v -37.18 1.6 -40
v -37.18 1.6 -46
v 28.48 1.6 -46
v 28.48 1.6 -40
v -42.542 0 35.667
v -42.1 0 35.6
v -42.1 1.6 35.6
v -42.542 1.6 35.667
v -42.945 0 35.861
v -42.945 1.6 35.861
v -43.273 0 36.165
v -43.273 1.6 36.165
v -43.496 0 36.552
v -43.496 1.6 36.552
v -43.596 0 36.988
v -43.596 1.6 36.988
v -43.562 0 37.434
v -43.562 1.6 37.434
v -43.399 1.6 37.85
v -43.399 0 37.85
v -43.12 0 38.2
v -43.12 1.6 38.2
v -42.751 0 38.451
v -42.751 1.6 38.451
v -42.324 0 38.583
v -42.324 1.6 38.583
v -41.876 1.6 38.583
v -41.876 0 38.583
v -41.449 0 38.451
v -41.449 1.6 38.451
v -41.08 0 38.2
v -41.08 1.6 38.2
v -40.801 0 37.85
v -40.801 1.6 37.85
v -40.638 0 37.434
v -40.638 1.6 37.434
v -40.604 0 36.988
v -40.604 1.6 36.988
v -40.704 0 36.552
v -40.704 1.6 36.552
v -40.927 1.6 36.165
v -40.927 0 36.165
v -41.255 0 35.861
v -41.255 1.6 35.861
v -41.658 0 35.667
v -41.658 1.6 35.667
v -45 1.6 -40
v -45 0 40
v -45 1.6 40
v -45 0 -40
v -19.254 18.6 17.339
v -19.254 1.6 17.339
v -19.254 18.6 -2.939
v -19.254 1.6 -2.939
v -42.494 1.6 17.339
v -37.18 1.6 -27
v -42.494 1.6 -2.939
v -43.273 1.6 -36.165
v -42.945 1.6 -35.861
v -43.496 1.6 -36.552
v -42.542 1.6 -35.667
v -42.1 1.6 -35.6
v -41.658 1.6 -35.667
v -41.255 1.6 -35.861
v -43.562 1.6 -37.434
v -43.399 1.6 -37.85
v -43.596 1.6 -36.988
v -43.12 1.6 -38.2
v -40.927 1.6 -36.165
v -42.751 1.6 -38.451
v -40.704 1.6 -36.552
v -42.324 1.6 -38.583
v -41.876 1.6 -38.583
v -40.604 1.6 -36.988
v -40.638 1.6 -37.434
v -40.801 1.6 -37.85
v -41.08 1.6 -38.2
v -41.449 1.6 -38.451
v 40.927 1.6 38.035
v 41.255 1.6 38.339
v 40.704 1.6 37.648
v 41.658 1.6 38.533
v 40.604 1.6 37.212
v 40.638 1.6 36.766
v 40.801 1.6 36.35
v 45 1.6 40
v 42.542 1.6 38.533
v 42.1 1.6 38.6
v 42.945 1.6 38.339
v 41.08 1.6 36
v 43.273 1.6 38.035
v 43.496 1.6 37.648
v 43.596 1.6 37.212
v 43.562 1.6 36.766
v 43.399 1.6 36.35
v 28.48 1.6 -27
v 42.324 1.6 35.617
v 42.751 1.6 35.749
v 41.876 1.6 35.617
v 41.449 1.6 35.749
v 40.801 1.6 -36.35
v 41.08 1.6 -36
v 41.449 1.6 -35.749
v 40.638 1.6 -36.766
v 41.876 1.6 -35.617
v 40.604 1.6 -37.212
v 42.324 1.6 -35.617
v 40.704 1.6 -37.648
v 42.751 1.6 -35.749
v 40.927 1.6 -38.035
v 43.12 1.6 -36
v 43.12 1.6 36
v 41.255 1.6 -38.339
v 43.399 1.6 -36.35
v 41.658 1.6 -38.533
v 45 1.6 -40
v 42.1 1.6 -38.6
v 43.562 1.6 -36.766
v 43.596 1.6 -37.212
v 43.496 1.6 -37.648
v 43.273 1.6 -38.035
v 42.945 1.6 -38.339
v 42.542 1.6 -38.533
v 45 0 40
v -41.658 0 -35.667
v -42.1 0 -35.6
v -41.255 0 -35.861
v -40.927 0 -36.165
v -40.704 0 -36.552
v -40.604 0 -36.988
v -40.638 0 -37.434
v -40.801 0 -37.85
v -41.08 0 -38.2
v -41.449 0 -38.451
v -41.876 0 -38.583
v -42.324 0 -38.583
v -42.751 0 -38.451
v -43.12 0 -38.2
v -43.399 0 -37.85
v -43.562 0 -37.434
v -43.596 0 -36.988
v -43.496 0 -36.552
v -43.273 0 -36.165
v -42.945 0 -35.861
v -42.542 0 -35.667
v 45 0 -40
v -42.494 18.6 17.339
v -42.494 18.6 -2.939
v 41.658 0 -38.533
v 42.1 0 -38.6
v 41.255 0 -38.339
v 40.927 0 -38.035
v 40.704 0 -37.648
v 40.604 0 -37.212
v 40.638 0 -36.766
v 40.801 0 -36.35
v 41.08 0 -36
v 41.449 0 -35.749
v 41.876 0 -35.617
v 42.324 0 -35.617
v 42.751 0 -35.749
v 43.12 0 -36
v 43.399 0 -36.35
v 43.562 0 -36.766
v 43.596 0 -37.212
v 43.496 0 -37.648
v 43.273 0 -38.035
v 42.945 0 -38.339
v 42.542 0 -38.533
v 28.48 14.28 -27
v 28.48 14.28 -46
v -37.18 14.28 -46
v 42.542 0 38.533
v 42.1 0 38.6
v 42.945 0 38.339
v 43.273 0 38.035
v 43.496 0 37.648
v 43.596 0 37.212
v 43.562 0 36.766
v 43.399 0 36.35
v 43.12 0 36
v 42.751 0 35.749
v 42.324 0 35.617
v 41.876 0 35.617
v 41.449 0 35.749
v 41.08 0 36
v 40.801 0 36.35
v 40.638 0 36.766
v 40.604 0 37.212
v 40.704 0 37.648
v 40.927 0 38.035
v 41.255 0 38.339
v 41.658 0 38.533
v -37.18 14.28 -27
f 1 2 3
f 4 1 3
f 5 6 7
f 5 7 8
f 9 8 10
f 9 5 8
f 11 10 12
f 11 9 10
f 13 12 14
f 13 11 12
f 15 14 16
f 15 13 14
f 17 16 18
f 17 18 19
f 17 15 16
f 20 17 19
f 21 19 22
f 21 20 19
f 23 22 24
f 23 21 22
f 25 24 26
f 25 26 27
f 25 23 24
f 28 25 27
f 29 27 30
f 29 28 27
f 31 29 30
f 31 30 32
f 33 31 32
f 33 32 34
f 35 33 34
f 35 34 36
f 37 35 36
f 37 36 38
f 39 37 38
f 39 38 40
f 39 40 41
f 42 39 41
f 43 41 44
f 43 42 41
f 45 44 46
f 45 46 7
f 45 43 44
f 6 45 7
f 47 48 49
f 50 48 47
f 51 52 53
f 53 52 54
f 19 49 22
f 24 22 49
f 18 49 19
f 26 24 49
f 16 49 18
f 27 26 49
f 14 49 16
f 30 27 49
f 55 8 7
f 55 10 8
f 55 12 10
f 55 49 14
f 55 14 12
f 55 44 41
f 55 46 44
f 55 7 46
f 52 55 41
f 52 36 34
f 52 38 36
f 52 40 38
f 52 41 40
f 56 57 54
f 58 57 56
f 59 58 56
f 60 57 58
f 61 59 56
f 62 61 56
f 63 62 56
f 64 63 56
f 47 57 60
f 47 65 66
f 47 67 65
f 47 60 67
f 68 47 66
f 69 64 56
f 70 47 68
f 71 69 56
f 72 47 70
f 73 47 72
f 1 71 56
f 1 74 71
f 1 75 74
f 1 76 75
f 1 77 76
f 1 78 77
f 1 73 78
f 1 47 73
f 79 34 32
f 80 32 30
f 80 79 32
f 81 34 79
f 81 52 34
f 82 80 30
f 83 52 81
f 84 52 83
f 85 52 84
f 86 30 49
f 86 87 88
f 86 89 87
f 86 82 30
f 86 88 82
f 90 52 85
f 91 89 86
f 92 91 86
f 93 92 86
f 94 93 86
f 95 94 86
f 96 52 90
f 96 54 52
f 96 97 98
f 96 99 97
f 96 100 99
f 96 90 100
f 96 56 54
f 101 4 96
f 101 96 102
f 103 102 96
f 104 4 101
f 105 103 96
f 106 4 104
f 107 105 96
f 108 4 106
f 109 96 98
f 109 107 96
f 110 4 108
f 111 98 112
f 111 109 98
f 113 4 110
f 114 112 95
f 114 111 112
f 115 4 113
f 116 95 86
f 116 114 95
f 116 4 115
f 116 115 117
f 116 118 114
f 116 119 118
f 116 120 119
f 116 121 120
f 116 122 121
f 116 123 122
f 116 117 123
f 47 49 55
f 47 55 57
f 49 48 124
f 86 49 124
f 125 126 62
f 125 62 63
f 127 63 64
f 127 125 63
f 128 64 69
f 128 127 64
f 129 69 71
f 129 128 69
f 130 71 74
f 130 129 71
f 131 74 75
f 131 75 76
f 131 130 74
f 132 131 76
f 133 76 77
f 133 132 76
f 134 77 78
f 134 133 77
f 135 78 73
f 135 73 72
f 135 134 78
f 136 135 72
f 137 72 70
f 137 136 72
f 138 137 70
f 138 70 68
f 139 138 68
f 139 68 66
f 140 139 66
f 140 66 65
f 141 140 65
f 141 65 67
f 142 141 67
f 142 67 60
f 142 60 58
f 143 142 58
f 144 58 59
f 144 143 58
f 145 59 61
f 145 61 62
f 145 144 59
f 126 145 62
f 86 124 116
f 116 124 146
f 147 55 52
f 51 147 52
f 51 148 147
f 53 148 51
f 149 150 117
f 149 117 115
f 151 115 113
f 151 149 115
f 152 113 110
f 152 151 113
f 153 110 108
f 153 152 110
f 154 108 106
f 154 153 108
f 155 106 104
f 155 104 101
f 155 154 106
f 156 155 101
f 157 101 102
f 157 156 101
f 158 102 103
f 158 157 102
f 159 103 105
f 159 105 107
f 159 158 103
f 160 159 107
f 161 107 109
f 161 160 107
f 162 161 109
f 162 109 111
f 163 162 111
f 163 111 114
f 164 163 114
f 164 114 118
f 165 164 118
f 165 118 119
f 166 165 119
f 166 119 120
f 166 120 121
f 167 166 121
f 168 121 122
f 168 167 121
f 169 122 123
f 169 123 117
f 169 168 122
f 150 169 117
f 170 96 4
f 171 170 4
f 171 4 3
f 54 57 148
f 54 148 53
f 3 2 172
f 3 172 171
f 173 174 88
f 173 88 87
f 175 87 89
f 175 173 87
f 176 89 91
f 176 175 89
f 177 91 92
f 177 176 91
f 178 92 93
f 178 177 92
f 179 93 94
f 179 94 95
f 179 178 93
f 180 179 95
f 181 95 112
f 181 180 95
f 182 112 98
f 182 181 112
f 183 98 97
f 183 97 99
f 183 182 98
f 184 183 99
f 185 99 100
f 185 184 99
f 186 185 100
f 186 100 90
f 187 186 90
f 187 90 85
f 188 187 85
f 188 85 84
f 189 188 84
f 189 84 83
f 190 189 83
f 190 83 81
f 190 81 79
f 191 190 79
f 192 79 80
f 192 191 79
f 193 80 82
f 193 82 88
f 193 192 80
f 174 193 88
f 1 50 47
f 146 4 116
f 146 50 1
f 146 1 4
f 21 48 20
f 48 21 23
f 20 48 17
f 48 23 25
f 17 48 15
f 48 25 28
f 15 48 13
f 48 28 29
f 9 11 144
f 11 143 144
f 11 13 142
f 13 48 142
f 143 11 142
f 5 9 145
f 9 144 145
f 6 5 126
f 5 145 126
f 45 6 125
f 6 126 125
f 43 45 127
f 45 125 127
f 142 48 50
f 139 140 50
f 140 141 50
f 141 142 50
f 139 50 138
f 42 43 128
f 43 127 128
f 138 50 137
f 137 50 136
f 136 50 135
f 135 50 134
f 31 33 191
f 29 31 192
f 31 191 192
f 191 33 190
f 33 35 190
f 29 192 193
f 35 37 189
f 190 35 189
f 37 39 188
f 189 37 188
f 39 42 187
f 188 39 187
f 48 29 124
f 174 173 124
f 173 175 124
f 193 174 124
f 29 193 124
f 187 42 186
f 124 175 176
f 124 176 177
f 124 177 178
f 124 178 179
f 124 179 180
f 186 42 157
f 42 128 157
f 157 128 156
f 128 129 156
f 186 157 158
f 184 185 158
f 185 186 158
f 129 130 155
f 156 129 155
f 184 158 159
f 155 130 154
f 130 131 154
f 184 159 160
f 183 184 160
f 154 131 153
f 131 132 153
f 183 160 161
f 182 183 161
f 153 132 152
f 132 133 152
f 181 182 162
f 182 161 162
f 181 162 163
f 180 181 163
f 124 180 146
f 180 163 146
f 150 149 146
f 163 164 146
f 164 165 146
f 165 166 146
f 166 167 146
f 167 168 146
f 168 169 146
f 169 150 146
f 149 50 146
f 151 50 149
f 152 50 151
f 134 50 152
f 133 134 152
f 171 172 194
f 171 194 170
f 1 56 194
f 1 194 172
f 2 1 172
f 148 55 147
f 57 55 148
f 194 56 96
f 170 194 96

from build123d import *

# Parameters (mm, degrees)
SKETCH1_W           = 90
SKETCH1_H           = 80
SKETCH1_R           = 1.5
BOSS_EXTRUDE2_DEPTH = 1.6
SKETCH2_W           = 65.66
SKETCH2_H           = 19
BOSS_EXTRUDE3_DEPTH = 12.68
SKETCH3_W           = 23.240933929
SKETCH3_H           = 20.278854114
BOSS_EXTRUDE4_DEPTH = 17


with BuildPart() as part:
    # Sketch1 → Boss-Extrude2 (new body)
    with BuildSketch(Plane(origin=(0, 0, 0), x_dir=(1, 0, 0), z_dir=(0, 1, 0))):
        Rectangle(SKETCH1_W, SKETCH1_H)
        with Locations(Location((-42.1, 37.1, 0), (0, 0, 270))):
            Circle(SKETCH1_R, mode=Mode.SUBTRACT)
        with Locations(Location((42.1, 37.1, 0), (0, 0, 90))):
            Circle(SKETCH1_R, mode=Mode.SUBTRACT)
        with Locations(Location((-42.1, -37.1, 0), (0, 0, 90))):
            Circle(SKETCH1_R, mode=Mode.SUBTRACT)
        with Locations(Location((42.1, -37.1, 0), (0, 0, 270))):
            Circle(SKETCH1_R, mode=Mode.SUBTRACT)
    extrude(amount=BOSS_EXTRUDE2_DEPTH)

    # Sketch2 → Boss-Extrude3 (add)
    with BuildSketch(Plane(origin=(0, 1.6, 0), x_dir=(1, 0, 0), z_dir=(0, 1, 0))):
        with Locations((-4.35, 36.5)):
            Rectangle(SKETCH2_W, SKETCH2_H)
    extrude(amount=BOSS_EXTRUDE3_DEPTH)

    # Sketch3 → Boss-Extrude4 (add)
    with BuildSketch(Plane(origin=(0, 1.6, 0), x_dir=(1, 0, 0), z_dir=(0, 1, 0))):
        with Locations((-30.87398576, -7.2)):
            Rectangle(SKETCH3_W, SKETCH3_H)
    extrude(amount=BOSS_EXTRUDE4_DEPTH)


solid = part.part
